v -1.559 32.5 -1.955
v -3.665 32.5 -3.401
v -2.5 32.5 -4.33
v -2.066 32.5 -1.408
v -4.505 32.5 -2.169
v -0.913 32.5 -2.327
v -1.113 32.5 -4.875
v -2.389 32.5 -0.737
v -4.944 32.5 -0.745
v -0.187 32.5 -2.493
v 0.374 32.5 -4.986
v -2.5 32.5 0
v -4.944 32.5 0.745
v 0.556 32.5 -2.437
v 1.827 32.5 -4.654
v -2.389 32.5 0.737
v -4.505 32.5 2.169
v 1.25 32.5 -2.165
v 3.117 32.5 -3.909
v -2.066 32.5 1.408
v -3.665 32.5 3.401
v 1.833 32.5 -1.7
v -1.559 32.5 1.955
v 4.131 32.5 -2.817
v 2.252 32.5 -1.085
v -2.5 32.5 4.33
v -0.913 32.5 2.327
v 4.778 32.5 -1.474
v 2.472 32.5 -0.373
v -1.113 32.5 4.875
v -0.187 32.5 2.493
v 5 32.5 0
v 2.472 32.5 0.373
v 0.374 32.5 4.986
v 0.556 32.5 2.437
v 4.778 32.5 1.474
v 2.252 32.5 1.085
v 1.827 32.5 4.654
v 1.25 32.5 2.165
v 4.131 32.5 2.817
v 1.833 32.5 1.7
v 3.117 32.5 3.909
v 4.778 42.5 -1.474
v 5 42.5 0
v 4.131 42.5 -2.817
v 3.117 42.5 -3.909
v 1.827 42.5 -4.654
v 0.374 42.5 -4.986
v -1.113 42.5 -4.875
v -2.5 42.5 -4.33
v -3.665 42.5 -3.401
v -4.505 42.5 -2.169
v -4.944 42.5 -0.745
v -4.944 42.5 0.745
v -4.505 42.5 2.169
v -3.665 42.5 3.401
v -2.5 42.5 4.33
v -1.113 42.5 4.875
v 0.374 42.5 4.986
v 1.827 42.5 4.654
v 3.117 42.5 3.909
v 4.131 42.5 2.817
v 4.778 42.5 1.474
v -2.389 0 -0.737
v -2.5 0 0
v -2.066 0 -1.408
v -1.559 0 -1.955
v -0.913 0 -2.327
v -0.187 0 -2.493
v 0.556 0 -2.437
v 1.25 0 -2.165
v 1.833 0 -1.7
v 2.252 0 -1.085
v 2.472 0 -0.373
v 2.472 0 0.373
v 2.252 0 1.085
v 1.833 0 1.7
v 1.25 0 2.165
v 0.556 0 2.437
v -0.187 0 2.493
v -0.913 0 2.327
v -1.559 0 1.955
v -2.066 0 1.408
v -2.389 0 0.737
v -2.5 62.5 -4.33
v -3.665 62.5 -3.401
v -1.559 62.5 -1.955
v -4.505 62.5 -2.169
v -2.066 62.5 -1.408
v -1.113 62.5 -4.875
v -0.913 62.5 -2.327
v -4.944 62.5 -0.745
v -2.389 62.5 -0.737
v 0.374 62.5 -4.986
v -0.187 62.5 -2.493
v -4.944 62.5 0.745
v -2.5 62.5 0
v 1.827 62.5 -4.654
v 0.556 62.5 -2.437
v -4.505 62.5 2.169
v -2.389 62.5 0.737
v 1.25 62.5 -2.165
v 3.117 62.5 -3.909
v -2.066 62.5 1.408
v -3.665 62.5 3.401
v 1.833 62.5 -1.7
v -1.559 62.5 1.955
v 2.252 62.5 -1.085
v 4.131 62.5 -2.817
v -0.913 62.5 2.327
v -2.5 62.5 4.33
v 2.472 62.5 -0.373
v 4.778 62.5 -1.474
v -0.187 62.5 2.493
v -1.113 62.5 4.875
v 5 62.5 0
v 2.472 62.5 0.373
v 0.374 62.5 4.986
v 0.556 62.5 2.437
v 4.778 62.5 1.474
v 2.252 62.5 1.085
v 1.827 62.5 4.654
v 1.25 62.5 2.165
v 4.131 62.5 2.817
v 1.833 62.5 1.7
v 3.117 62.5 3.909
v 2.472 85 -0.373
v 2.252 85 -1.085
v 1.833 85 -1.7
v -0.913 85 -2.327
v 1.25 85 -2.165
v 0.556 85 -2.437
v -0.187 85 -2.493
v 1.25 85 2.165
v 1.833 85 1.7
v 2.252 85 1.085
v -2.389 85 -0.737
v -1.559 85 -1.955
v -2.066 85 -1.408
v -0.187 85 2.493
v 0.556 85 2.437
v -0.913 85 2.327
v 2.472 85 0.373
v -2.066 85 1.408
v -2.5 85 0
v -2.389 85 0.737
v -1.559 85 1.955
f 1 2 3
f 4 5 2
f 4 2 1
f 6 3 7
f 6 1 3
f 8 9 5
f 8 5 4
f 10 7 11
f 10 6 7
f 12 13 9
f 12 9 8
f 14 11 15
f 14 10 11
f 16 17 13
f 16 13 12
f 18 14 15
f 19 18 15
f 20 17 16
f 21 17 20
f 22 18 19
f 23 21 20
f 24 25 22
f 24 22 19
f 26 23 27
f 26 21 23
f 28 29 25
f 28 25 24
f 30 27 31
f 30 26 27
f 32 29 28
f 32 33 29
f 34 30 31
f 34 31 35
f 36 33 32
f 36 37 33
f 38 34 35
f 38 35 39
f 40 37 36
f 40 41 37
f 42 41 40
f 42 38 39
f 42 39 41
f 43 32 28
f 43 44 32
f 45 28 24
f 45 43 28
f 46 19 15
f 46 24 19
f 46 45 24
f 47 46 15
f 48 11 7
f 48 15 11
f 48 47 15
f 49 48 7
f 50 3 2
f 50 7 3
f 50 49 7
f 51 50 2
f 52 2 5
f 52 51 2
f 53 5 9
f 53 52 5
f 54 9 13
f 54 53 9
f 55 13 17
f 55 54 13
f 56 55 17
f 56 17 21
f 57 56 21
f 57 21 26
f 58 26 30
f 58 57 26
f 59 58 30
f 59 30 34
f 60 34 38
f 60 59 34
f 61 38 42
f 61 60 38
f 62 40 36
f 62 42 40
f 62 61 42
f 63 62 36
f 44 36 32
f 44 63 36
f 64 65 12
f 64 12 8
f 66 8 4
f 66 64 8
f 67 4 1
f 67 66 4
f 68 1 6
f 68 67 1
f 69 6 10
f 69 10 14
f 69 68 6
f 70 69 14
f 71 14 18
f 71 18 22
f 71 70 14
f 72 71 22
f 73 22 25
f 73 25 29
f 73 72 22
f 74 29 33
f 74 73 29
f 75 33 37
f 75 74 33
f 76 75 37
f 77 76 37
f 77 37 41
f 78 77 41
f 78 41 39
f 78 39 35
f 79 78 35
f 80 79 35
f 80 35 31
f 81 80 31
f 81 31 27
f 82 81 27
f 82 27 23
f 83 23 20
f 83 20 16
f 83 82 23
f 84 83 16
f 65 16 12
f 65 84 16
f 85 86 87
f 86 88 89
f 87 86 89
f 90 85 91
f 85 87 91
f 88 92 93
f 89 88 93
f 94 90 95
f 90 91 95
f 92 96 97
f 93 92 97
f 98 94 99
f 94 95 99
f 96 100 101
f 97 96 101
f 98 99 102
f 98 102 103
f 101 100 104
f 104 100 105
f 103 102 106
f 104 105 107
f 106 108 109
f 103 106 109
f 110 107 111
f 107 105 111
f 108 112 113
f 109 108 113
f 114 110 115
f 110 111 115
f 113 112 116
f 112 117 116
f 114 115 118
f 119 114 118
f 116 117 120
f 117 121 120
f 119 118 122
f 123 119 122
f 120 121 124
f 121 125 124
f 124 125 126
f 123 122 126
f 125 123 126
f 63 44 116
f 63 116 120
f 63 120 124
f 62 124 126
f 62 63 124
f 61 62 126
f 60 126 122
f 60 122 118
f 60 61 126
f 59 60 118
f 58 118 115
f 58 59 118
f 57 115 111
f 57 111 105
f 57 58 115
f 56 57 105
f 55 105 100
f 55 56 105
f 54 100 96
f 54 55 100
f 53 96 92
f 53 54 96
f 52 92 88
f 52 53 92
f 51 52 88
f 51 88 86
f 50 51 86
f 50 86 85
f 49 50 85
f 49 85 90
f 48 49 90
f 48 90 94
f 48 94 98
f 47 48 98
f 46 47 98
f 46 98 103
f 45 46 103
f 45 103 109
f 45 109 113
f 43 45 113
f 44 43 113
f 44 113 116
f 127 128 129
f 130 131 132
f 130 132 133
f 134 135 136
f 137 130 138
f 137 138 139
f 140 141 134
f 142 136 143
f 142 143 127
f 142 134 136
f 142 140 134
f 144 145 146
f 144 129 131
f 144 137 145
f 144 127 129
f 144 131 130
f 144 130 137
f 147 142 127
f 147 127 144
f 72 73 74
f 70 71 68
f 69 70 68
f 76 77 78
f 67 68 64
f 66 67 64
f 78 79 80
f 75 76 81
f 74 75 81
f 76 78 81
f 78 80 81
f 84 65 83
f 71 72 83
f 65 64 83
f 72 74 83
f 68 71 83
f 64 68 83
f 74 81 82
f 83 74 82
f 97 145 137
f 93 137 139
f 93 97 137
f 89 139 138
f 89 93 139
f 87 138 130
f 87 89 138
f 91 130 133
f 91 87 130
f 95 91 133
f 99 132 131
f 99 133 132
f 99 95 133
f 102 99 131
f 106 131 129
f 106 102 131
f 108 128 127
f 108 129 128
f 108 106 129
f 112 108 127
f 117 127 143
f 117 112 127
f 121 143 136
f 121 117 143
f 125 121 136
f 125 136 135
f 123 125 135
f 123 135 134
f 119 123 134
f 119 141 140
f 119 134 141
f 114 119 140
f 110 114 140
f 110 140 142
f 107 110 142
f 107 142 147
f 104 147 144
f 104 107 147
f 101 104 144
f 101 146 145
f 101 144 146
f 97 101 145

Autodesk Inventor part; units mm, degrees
ref_plane "YZ Plane" through (0, 0, 0) normal (1, 0, 0) x (0, 1, 0)
ref_plane "XZ Plane" through (0, 0, 0) normal (0, 1, 0) x (-1, 0, 0)
ref_plane "XY Plane" through (0, 0, 0) normal (0, 0, 1) x (1, 0, 0)
sketch "Эскиз1" plane through (0, 0, 0) normal (0, 1, 0) x (-1, 0, 0)
  circle A0 centre (0, 0) radius 2.5
  dimension "d0" = 5
extrude "Выдавливание1" add sketch "Эскиз1" along normal blind 85
thread "Резьба1" size "M5x0.8" class "6g" standard "ANSI Metric M Profile" full length
ref_plane "РабПлоскость1" through (0, 42.5, 0) normal (0, -1, 0) x (1, 0, 0)
sketch "Эскиз2" plane through (0, 42.5, 0) normal (0, -1, 0) x (1, 0, 0)
  circle A0 centre (0, 0) radius 5
  dimension "d5" = 10
extrude "Выдавливание2" add sketch "Эскиз2" along normal blind 10 and the other way blind 20
properties part number "Screw"
